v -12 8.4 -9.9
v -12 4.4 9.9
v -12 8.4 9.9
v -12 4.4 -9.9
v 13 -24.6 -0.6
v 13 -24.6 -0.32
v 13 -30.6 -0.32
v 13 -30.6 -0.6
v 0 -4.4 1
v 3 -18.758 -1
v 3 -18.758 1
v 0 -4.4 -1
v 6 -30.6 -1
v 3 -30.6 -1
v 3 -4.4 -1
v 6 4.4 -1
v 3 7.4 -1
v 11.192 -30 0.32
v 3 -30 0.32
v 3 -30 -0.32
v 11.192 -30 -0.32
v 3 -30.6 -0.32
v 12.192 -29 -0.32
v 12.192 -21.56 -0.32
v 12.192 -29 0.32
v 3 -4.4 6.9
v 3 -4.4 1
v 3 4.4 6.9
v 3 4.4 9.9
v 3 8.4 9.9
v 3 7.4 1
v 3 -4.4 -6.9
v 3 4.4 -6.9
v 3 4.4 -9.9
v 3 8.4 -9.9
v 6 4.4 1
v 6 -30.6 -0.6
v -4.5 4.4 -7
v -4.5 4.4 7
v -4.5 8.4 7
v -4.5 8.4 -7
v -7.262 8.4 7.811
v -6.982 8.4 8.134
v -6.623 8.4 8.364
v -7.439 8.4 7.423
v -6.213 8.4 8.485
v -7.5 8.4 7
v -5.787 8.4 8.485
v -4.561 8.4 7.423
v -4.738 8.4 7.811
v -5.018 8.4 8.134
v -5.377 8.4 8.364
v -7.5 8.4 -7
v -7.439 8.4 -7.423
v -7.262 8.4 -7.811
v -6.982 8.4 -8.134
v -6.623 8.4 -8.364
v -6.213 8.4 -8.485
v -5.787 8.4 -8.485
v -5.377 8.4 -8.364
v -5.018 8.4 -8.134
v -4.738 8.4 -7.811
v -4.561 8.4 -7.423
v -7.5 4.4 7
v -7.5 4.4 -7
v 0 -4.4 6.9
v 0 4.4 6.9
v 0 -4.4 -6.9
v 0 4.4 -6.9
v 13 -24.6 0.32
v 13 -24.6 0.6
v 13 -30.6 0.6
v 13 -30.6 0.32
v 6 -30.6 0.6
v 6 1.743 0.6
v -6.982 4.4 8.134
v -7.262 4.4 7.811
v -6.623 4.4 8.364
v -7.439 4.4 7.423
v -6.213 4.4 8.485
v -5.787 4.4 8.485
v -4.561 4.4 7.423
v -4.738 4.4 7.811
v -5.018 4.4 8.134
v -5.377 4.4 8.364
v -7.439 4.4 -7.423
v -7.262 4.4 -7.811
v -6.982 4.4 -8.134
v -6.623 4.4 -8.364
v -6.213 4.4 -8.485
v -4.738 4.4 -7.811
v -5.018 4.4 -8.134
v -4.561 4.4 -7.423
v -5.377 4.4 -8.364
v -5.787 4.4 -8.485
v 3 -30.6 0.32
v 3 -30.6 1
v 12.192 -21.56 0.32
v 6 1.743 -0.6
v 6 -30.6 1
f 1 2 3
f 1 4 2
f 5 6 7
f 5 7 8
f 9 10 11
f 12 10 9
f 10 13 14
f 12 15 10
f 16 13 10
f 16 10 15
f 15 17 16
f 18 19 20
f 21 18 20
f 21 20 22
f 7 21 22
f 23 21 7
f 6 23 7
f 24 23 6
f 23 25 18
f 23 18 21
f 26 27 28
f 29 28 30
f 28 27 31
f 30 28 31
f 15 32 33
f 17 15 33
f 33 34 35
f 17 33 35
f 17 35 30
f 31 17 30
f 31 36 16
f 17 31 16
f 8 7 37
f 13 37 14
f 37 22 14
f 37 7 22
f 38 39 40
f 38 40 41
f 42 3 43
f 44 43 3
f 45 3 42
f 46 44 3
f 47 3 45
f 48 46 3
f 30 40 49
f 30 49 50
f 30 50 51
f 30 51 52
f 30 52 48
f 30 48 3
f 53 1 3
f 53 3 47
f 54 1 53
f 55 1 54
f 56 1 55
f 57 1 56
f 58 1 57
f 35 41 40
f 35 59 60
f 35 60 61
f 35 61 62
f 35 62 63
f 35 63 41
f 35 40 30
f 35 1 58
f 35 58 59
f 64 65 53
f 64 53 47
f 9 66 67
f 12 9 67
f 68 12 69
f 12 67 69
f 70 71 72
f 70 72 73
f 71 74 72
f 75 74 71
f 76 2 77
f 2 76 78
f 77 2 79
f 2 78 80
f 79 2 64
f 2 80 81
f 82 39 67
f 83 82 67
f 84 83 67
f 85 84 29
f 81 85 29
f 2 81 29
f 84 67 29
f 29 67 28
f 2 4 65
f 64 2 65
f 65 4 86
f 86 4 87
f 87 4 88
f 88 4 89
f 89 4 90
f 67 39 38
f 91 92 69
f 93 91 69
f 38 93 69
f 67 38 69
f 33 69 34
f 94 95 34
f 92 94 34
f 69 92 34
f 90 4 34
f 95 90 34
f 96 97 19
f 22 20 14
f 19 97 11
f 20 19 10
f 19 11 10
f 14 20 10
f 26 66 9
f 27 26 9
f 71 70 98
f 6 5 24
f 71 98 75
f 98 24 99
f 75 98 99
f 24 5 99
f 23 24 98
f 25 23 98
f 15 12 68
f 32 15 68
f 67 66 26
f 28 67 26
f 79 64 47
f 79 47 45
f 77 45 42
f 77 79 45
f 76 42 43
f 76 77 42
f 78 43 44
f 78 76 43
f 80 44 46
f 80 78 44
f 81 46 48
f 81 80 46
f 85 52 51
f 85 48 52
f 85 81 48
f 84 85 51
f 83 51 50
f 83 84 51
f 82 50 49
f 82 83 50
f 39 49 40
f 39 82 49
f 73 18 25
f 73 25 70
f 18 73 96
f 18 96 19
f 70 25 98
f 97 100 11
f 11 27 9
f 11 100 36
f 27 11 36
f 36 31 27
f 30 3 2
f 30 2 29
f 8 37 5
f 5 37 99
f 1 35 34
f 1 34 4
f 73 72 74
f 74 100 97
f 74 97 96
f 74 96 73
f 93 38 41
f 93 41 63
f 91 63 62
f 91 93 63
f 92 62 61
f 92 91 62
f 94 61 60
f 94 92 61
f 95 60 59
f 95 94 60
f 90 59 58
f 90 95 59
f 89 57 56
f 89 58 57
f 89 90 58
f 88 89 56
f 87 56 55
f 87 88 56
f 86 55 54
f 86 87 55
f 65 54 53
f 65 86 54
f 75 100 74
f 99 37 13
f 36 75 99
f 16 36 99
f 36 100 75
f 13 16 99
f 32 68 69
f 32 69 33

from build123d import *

# Parameters (mm, degrees)
SKETCH1_W               = 13.8
SKETCH1_H               = 8.8
BOSS_EXTRUDE1_DEPTH     = 3
SKETCH2_W               = 2
SKETCH2_H               = 35
BOSS_EXTRUDE2_DEPTH     = 3
SKETCH3_W               = 1.2
SKETCH3_H               = 6
BOSS_EXTRUDE3_DEPTH     = 7
FILLET3_R               = 10
SKETCH5_W               = 15
SKETCH5_H               = 13.8
BOSS_EXTRUDE4_DEPTH     = 4
SKETCH6_R               = 1.5
CUT_EXTRUDE4_DEPTH      = 38.968539608
BOSS_EXTRUDE5_DEPTH     = 2
CHAMFER2_SIZE           = 3
BOSS_EXTRUDE7_DEPTH     = 1.2
SKETCH12_W              = 15
SKETCH12_H              = 4
BOSS_EXTRUDE8_DEPTH     = 3
SKETCH13_W              = 15
SKETCH13_H              = 4
BOSS_EXTRUDE9_DEPTH     = 3
CUT_EXTRUDE7_DEPTH      = 43.28486727
CUT_EXTRUDE7_DEPTH_BACK = 43.28486727
CUT_EXTRUDE8_DEPTH      = 43.28486727
CUT_EXTRUDE8_DEPTH_BACK = 43.28486727
SKETCH15_W              = 0.807911756
SKETCH15_H              = 0.64
CUT_EXTRUDE9_DEPTH      = 41.244591358
CUT_EXTRUDE9_DEPTH_BACK = 41.244591358
SKETCH16_W              = 0.64
SKETCH16_H              = 0.6
CHAMFER3_SIZE           = 1


# Some blends are built 0.0001 mm under size
with BuildPart() as part:
    # Sketch1 → Boss-Extrude1 (new body)
    with BuildSketch(Plane(origin=(0, 0, 0), x_dir=(0, 0, -1), z_dir=(1, 0, 0))):
        Rectangle(SKETCH1_W, SKETCH1_H)
    extrude(amount=BOSS_EXTRUDE1_DEPTH)

    # Sketch2 → Boss-Extrude2 (add)
    with BuildSketch(Plane(origin=(3, 0, 0), x_dir=(0, 0, -1), z_dir=(1, 0, 0))):
        with Locations((0, -13.1)):
            Rectangle(SKETCH2_W, SKETCH2_H)
    extrude(amount=BOSS_EXTRUDE2_DEPTH)

    # Sketch3 → Boss-Extrude3 (add)
    with BuildSketch(Plane(origin=(6, 0, 0), x_dir=(0, 0, -1), z_dir=(1, 0, 0))):
        with Locations((0, -27.6)):
            Rectangle(SKETCH3_W, SKETCH3_H)
    extrude(amount=BOSS_EXTRUDE3_DEPTH)

    # Fillet3
    # the kernel refuses this fillet: 10 mm, written as the material it adds along each edge
    with BuildSketch(Plane(origin=(3, -4.4, 1), x_dir=(-1, 0, 0), z_dir=(0, 0, -1))) as fillet3_piece_1:
        with BuildLine():
            CenterArc((10, -7.141428429), FILLET3_R, 134.427004001, 45.572995999)
            Line((0, -7.141428429), (0, 0))
            Line((0, 0), (3, 0))
        make_face()
    extrude(amount=2)

    # Sketch5 → Boss-Extrude4 (add)
    with BuildSketch(Plane(origin=(0, 4.4, 0), x_dir=(1, 0, 0), z_dir=(0, 1, 0))):
        with Locations((-4.5, 0)):
            Rectangle(SKETCH5_W, SKETCH5_H)
    extrude(amount=BOSS_EXTRUDE4_DEPTH)

    # Sketch6 → Cut-Extrude4 (cut, through all)
    with BuildSketch(Plane.XZ.offset(-4.4)):
        with Locations(Location((-6, 3, 0), (0, 0, 270))):
            Circle(SKETCH6_R)
        with Locations(Location((-6, -3, 0), (0, 0, 270))):
            Circle(SKETCH6_R)
    extrude(amount=-CUT_EXTRUDE4_DEPTH, mode=Mode.SUBTRACT)

    # Sketch8 → Boss-Extrude5 (add)
    with BuildSketch(Plane(origin=(0, 0, -1), x_dir=(-1, 0, 0), z_dir=(0, 0, -1))):
        Polygon((-3, -18.758153574), (0, -4.4), (-3, -4.4), align=None)
    extrude(amount=-BOSS_EXTRUDE5_DEPTH)

    # Chamfer2
    chamfer2_edges = [part.edges().sort_by_distance(p)[0] for p in [
        (3, 4.4, 0),
    ]]
    chamfer(chamfer2_edges, length=CHAMFER2_SIZE - 0.0001)  # a hair under: the kernel refuses the full size

    # Sketch11 → Boss-Extrude7 (add)
    with BuildSketch(Plane(origin=(0, 0, -0.6), x_dir=(-1, 0, 0), z_dir=(0, 0, -1))):
        Polygon((-6, -24.6), (-13, -24.6), (-6, 1.742521041), align=None)
    extrude(amount=-BOSS_EXTRUDE7_DEPTH)

    # Sketch12 → Boss-Extrude8 (add)
    with BuildSketch(Plane(origin=(0, 0, -6.9), x_dir=(-1, 0, 0), z_dir=(0, 0, -1))):
        with Locations((4.5, 6.4)):
            Rectangle(SKETCH12_W, SKETCH12_H)
    extrude(amount=BOSS_EXTRUDE8_DEPTH)

    # Sketch13 → Boss-Extrude9 (add)
    with BuildSketch(Plane.XY.offset(6.9)):
        with Locations((-4.5, 6.4)):
            Rectangle(SKETCH13_W, SKETCH13_H)
    extrude(amount=BOSS_EXTRUDE9_DEPTH)

    # Sketch14 → Cut-Extrude7 (cut, two sides: drawn at the far end of the back side and taken through both)
    with BuildSketch(Plane(origin=(0, 8.4, 0), x_dir=(1, 0, 0), z_dir=(0, 1, 0)).offset(-CUT_EXTRUDE7_DEPTH_BACK)):
        with BuildLine():
            Line((-7.5, 7), (-7.5, -7))
            ThreePointArc((-7.5, -7), (-6, -8.5), (-4.5, -7))
            Line((-4.5, -7), (-4.5, 7))
            ThreePointArc((-4.5, 7), (-6, 8.5), (-7.5, 7))
        make_face()
    extrude(amount=CUT_EXTRUDE7_DEPTH + CUT_EXTRUDE7_DEPTH_BACK, mode=Mode.SUBTRACT)

    # Sketch15 → Cut-Extrude8 (cut, two sides: drawn at the far end of the back side and taken through both)
    with BuildSketch(Plane.XZ.offset(30.6).offset(-CUT_EXTRUDE8_DEPTH_BACK)):
        with Locations((12.596044122, 0)):
            Rectangle(SKETCH15_W, SKETCH15_H)
    extrude(amount=CUT_EXTRUDE8_DEPTH + CUT_EXTRUDE8_DEPTH_BACK, mode=Mode.SUBTRACT)

    # Sketch16 → Cut-Extrude9 (cut, two sides: drawn at the far end of the back side and taken through both)
    with BuildSketch(Plane(origin=(12.192088244, 0, 0), x_dir=(0, 0, -1), z_dir=(1, 0, 0)).offset(-CUT_EXTRUDE9_DEPTH_BACK)):
        with Locations((0, -30.3)):
            Rectangle(SKETCH16_W, SKETCH16_H)
    extrude(amount=CUT_EXTRUDE9_DEPTH + CUT_EXTRUDE9_DEPTH_BACK, mode=Mode.SUBTRACT)

    # Chamfer3
    chamfer3_edges = [part.edges().sort_by_distance(p)[0] for p in [
        (12.192088244, -30, 0),
    ]]
    chamfer(chamfer3_edges, length=CHAMFER3_SIZE)


solid = part.part
